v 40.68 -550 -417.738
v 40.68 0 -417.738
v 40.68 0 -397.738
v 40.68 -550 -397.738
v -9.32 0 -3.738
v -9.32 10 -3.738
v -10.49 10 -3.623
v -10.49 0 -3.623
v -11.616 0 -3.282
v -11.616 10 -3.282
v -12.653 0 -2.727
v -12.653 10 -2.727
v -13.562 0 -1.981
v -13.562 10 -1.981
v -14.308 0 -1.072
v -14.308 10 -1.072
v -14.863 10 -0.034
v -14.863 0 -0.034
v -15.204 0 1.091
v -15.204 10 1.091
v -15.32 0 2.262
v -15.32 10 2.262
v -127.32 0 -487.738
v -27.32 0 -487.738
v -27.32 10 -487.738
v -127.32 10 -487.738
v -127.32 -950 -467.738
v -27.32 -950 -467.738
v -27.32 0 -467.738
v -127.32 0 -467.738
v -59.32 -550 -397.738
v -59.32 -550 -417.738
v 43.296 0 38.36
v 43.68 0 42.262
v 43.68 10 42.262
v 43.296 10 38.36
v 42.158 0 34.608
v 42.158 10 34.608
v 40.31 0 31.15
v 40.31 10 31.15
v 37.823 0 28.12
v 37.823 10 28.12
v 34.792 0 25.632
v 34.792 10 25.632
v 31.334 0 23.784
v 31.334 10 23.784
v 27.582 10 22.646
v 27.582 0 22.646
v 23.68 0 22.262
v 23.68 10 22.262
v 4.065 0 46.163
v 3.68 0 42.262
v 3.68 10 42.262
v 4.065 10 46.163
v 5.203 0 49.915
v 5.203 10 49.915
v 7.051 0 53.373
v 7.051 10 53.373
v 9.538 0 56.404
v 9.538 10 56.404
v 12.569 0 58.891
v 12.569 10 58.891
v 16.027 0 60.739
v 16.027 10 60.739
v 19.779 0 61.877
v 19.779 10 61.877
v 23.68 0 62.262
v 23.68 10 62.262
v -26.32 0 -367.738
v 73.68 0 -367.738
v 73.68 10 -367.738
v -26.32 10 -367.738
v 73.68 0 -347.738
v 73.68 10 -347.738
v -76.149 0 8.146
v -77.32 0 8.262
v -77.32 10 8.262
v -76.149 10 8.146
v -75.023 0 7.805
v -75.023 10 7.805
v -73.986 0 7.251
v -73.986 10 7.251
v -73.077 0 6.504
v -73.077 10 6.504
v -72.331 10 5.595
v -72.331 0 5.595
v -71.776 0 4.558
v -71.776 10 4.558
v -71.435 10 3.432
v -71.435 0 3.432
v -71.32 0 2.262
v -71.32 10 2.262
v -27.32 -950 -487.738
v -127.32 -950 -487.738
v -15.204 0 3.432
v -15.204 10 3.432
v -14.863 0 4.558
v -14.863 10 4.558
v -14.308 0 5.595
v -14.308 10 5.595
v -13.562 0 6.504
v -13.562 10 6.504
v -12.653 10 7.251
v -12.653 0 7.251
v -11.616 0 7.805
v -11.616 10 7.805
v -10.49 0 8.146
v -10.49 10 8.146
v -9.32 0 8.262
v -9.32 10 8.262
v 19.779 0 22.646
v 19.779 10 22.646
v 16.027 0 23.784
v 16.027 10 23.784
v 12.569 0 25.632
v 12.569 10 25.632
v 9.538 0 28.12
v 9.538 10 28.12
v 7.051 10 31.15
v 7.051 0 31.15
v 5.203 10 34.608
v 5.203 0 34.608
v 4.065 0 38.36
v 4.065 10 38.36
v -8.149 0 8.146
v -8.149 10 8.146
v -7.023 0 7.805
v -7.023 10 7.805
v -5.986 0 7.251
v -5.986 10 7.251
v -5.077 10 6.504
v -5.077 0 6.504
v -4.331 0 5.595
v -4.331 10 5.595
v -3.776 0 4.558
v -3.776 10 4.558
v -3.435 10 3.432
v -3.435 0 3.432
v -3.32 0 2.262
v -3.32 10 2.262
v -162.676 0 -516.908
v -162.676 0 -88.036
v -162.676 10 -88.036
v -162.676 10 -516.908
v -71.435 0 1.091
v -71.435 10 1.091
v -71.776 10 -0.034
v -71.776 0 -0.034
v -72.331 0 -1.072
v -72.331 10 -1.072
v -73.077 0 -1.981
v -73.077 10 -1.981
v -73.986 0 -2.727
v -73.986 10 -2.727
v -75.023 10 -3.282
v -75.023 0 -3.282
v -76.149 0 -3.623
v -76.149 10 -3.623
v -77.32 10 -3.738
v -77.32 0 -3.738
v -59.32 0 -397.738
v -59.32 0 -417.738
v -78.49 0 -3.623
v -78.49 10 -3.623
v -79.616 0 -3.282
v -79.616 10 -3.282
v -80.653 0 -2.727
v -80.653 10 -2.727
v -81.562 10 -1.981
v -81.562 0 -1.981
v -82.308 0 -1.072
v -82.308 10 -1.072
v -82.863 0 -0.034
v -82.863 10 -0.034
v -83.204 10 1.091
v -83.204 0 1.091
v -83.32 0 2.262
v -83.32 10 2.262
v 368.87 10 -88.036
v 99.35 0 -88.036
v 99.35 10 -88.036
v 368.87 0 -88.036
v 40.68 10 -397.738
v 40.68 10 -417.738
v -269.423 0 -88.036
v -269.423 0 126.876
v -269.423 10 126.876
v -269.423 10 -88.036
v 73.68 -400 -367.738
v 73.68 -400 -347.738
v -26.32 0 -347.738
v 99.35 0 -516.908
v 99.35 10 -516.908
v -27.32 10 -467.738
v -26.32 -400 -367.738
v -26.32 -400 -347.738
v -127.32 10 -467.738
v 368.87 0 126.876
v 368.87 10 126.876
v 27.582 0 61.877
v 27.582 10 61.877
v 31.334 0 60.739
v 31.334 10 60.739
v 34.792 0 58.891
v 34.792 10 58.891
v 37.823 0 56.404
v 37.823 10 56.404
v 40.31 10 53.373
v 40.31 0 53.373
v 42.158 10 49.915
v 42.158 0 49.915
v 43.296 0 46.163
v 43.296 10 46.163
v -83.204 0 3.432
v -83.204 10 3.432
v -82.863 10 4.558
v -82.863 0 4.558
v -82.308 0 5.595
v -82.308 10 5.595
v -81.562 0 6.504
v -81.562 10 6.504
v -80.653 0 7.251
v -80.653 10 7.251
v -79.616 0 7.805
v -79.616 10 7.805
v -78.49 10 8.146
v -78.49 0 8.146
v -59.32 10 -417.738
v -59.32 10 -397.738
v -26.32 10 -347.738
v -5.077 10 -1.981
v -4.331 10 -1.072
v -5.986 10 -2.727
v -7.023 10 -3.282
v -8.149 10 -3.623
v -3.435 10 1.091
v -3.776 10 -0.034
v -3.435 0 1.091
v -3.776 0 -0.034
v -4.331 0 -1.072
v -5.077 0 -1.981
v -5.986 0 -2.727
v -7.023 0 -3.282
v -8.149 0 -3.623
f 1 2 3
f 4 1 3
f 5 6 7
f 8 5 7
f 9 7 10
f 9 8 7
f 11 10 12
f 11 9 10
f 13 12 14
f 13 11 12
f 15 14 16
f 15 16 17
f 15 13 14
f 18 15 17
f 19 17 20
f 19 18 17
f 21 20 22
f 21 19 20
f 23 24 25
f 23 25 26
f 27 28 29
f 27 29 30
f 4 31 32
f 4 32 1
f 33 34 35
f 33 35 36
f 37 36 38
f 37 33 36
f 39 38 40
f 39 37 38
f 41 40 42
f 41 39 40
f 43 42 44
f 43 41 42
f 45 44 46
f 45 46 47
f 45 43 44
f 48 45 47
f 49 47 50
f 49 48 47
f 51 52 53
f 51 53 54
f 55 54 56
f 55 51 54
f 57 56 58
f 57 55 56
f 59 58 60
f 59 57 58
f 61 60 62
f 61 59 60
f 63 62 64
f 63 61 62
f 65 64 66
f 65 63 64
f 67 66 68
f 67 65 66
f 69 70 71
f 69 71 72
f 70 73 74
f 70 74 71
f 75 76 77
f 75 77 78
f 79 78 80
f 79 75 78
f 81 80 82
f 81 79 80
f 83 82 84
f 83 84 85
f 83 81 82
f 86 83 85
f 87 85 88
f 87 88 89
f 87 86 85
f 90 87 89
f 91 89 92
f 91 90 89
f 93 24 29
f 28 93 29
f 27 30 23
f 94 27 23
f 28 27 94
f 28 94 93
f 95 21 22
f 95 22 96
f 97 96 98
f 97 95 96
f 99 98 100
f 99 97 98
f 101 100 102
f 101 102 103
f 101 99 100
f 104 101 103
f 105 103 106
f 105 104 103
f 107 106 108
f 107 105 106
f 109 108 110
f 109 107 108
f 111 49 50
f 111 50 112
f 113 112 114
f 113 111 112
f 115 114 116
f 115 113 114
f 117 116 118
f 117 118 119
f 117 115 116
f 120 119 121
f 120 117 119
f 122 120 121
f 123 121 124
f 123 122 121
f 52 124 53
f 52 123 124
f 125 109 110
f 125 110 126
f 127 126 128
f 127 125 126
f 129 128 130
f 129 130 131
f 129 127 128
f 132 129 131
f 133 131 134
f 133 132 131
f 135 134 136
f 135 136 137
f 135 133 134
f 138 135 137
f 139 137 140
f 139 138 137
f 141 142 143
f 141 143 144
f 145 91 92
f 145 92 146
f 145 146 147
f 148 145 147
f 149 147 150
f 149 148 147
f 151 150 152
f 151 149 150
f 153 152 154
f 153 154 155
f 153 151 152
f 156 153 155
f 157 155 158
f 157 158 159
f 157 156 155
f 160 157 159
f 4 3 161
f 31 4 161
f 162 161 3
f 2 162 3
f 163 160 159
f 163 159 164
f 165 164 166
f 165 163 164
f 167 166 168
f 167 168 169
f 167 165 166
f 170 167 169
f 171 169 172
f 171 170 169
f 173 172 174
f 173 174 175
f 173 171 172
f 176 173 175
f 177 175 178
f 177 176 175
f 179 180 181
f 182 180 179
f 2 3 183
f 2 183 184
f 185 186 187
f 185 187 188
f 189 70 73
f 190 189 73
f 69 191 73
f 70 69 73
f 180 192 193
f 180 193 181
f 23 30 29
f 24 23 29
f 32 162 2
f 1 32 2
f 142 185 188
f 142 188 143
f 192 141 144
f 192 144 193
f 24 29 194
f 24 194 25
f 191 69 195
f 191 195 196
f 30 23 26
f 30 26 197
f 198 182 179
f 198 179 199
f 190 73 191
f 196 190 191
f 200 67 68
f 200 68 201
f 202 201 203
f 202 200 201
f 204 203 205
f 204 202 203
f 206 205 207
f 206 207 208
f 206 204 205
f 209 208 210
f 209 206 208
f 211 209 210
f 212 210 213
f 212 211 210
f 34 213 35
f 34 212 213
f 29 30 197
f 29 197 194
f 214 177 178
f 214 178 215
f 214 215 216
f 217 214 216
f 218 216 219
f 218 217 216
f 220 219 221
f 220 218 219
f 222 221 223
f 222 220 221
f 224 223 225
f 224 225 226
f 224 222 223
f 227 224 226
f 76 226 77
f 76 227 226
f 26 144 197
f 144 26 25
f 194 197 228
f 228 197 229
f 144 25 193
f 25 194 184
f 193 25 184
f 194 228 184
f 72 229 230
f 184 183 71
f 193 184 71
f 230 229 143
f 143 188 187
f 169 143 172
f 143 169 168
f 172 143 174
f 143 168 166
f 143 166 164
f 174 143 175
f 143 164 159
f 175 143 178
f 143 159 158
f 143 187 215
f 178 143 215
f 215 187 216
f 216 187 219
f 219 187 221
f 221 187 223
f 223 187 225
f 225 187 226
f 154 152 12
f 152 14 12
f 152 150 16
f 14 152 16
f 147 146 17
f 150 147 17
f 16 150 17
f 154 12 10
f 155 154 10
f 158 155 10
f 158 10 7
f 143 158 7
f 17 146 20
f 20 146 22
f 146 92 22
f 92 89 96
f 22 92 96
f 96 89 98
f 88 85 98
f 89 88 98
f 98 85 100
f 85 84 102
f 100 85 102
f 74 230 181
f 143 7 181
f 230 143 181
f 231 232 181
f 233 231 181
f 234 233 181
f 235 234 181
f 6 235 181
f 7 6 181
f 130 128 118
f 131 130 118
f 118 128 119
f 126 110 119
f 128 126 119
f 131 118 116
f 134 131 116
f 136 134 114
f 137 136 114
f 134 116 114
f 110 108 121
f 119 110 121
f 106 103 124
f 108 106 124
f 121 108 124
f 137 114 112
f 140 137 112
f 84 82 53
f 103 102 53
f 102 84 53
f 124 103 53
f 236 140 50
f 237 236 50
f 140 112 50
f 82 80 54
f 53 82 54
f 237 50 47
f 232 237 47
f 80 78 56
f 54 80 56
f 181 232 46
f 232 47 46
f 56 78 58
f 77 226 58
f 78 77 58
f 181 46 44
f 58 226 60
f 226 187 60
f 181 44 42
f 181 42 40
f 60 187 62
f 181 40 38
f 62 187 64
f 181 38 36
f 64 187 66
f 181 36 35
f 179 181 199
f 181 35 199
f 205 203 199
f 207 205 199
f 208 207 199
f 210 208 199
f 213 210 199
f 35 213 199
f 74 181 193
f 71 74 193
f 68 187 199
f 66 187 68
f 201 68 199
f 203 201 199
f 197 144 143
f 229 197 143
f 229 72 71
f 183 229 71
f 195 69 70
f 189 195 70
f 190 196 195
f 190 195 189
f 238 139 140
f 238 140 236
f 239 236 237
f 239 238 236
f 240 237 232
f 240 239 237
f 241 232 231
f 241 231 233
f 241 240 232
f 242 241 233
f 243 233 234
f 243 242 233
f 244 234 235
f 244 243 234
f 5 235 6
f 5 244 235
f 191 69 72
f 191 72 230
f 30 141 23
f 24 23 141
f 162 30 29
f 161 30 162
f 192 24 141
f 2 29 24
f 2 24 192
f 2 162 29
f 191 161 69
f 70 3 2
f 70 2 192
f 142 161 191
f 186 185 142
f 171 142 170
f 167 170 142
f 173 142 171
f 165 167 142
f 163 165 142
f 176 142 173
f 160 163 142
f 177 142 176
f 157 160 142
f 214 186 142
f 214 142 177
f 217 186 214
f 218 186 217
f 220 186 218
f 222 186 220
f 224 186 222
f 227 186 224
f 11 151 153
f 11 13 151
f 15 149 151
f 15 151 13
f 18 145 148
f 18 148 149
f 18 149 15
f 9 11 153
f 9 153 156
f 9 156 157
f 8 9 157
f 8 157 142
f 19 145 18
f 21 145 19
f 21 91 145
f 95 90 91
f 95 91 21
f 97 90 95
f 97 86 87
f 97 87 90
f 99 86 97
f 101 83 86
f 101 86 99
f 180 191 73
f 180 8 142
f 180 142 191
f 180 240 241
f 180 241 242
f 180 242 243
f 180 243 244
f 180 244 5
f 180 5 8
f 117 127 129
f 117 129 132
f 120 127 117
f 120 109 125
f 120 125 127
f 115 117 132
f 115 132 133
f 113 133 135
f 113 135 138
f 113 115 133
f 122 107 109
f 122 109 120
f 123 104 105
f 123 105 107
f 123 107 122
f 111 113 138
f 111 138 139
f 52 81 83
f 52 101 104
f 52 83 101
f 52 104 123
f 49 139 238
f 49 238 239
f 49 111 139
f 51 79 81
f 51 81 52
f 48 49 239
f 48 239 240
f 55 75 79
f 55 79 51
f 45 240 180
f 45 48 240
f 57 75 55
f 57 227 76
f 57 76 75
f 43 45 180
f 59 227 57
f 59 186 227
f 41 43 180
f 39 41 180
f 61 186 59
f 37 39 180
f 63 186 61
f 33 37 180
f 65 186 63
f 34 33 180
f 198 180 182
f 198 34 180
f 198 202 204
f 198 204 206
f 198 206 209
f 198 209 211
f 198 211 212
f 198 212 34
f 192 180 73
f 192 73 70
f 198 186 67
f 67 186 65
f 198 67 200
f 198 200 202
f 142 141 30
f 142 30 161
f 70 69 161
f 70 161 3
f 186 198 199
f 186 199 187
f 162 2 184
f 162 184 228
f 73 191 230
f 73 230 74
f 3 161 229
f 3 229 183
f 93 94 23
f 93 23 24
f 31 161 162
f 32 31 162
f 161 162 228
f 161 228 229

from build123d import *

# Parameters (mm, degrees)
F0_W     = 33
F0_H     = 259.7026857734
F1_DEPTH = 10
F0_W_2   = 17
F0_H_2   = 20
F2_DEPTH = 400
F3_DEPTH = 550
F4_DEPTH = 950


with BuildPart() as f1:
    # F0 (on Front) → F1 (new body)
    with BuildSketch(Plane.XZ):
        Polygon((-127.319598034, -467.7383065224), (-162.6763641834, -467.7383065224), (-162.6763641834, -516.9078111649), (99.3499830365, -516.9078111649), (99.3499830365, -467.7383065224), (-27.319598034, -467.7383065224), (-27.319598034, -487.7383065224), (-127.319598034, -487.7383065224), align=None)
        Polygon((99.3499830365, -88.035620749), (23.680401966, -88.035620749), (23.680401966, -347.7383065224), (73.680401966, -347.7383065224), (99.3499830365, -347.7383065224), align=None)
        Polygon((-77.319598034, -347.7383065224), (-77.319598034, -88.035620749), (-162.6763641834, -88.035620749), (-162.6763641834, -397.7383065224), (-77.319598034, -397.7383065224), align=None)
        Polygon((-77.319598034, -397.7383065224), (-162.6763641834, -397.7383065224), (-162.6763641834, -467.7383065224), (-127.319598034, -467.7383065224), (-77.319598034, -467.7383065224), align=None)
        Polygon((99.3499830365, -347.7383065224), (73.680401966, -347.7383065224), (73.680401966, -367.7383065224), (-9.319598034, -367.7383065224), (-9.319598034, -397.7383065224), (40.680401966, -397.7383065224), (99.3499830365, -397.7383065224), align=None)
        Polygon((-59.319598034, -397.7383065224), (-77.319598034, -397.7383065224), (-77.319598034, -467.7383065224), (-27.319598034, -467.7383065224), (99.3499830365, -467.7383065224), (99.3499830365, -397.7383065224), (40.680401966, -397.7383065224), (40.680401966, -417.7383065224), (-59.319598034, -417.7383065224), align=None)
        with BuildLine():
            Line((-77.319598034, 8.2616934776), (-77.319598034, 42.2616934776))
            Line((-77.319598034, 42.2616934776), (-9.319598034, 42.2616934776))
            Line((-9.319598034, 42.2616934776), (3.680401966, 42.2616934776))
            ThreePointArc((3.680401966, 42.2616934776), (9.5382663422, 56.4038291014), (23.680401966, 62.2616934776))
            ThreePointArc((23.680401966, 62.2616934776), (37.8225375897, 56.4038291014), (43.680401966, 42.2616934776))
            ThreePointArc((43.680401966, 42.2616934776), (37.8225375897, 28.1195578539), (23.680401966, 22.2616934776))
            Line((23.680401966, 22.2616934776), (23.680401966, 2.2616934776))
            Line((23.680401966, 2.2616934776), (23.680401966, -88.035620749))
            Line((23.680401966, -88.035620749), (99.3499830365, -88.035620749))
            Line((99.3499830365, -88.035620749), (368.8704967499, -88.035620749))
            Line((368.8704967499, -88.035620749), (368.8704967499, 126.8763244152))
            Line((368.8704967499, 126.8763244152), (-269.4225609303, 126.8763244152))
            Line((-269.4225609303, 126.8763244152), (-269.4225609303, -88.035620749))
            Line((-269.4225609303, -88.035620749), (-162.6763641834, -88.035620749))
            Line((-162.6763641834, -88.035620749), (-77.319598034, -88.035620749))
            Line((-77.319598034, -88.035620749), (-77.319598034, -3.7383065224))
            ThreePointArc((-77.319598034, -3.7383065224), (-81.5622387211, -1.9809472095), (-83.319598034, 2.2616934776))
            ThreePointArc((-83.319598034, 2.2616934776), (-81.5622387211, 6.5043341647), (-77.319598034, 8.2616934776))
        make_face()
        with BuildLine():
            Line((-9.319598034, 42.2616934776), (-77.319598034, 42.2616934776))
            Line((-77.319598034, 42.2616934776), (-77.319598034, 8.2616934776))
            ThreePointArc((-77.319598034, 8.2616934776), (-73.0769573469, 6.5043341647), (-71.319598034, 2.2616934776))
            Line((-71.319598034, 2.2616934776), (-15.319598034, 2.2616934776))
            ThreePointArc((-15.319598034, 2.2616934776), (-13.5622387211, 6.5043341647), (-9.319598034, 8.2616934776))
            Line((-9.319598034, 8.2616934776), (-9.319598034, 42.2616934776))
        make_face()
        with BuildLine():
            Line((3.680401966, 42.2616934776), (-9.319598034, 42.2616934776))
            Line((-9.319598034, 42.2616934776), (-9.319598034, 8.2616934776))
            ThreePointArc((-9.319598034, 8.2616934776), (-5.0769573469, 6.5043341647), (-3.319598034, 2.2616934776))
            Line((-3.319598034, 2.2616934776), (23.680401966, 2.2616934776))
            Line((23.680401966, 2.2616934776), (23.680401966, 22.2616934776))
            ThreePointArc((23.680401966, 22.2616934776), (9.5382663422, 28.1195578539), (3.680401966, 42.2616934776))
        make_face()
        with BuildLine():
            Line((23.680401966, 2.2616934776), (-3.319598034, 2.2616934776))
            ThreePointArc((-3.319598034, 2.2616934776), (-5.0769573469, -1.9809472095), (-9.319598034, -3.7383065224))
            Line((-9.319598034, -3.7383065224), (-9.319598034, -88.035620749))
            Line((-9.319598034, -88.035620749), (23.680401966, -88.035620749))
            Line((23.680401966, -88.035620749), (23.680401966, 2.2616934776))
        make_face()
        with BuildLine():
            Line((-15.319598034, 2.2616934776), (-71.319598034, 2.2616934776))
            ThreePointArc((-71.319598034, 2.2616934776), (-73.0769573469, -1.9809472095), (-77.319598034, -3.7383065224))
            Line((-77.319598034, -3.7383065224), (-77.319598034, -88.035620749))
            Line((-77.319598034, -88.035620749), (-9.319598034, -88.035620749))
            Line((-9.319598034, -88.035620749), (-9.319598034, -3.7383065224))
            ThreePointArc((-9.319598034, -3.7383065224), (-13.5622387211, -1.9809472095), (-15.319598034, 2.2616934776))
        make_face()
        Polygon((-9.319598034, -88.035620749), (-77.319598034, -88.035620749), (-77.319598034, -347.7383065224), (-26.319598034, -347.7383065224), (-9.319598034, -347.7383065224), align=None)
        with Locations((7.180401966, -217.8869636357)):
            Rectangle(F0_W, F0_H)
        Polygon((-26.319598034, -347.7383065224), (-77.319598034, -347.7383065224), (-77.319598034, -397.7383065224), (-59.319598034, -397.7383065224), (-9.319598034, -397.7383065224), (-9.319598034, -367.7383065224), (-26.319598034, -367.7383065224), align=None)
    extrude(amount=-F1_DEPTH)


with BuildPart() as f2:
    # F0 (on Front) → F2 (new body)
    with BuildSketch(Plane.XZ):
        Polygon((73.680401966, -347.7383065224), (23.680401966, -347.7383065224), (-9.319598034, -347.7383065224), (-9.319598034, -367.7383065224), (73.680401966, -367.7383065224), align=None)
        with Locations((-17.819598034, -357.7383065224)):
            Rectangle(F0_W_2, F0_H_2)
    extrude(amount=F2_DEPTH)


with BuildPart() as f3:
    # F0 (on Front) → F3 (new body)
    with BuildSketch(Plane.XZ):
        Polygon((-9.319598034, -397.7383065224), (-59.319598034, -397.7383065224), (-59.319598034, -417.7383065224), (40.680401966, -417.7383065224), (40.680401966, -397.7383065224), align=None)
    extrude(amount=F3_DEPTH)


with BuildPart() as f4:
    # F0 (on Front) → F4 (new body)
    with BuildSketch(Plane.XZ):
        Polygon((-27.319598034, -467.7383065224), (-77.319598034, -467.7383065224), (-127.319598034, -467.7383065224), (-127.319598034, -487.7383065224), (-27.319598034, -487.7383065224), align=None)
    extrude(amount=F4_DEPTH)


solid = Compound([f1.part, f2.part, f3.part, f4.part])
